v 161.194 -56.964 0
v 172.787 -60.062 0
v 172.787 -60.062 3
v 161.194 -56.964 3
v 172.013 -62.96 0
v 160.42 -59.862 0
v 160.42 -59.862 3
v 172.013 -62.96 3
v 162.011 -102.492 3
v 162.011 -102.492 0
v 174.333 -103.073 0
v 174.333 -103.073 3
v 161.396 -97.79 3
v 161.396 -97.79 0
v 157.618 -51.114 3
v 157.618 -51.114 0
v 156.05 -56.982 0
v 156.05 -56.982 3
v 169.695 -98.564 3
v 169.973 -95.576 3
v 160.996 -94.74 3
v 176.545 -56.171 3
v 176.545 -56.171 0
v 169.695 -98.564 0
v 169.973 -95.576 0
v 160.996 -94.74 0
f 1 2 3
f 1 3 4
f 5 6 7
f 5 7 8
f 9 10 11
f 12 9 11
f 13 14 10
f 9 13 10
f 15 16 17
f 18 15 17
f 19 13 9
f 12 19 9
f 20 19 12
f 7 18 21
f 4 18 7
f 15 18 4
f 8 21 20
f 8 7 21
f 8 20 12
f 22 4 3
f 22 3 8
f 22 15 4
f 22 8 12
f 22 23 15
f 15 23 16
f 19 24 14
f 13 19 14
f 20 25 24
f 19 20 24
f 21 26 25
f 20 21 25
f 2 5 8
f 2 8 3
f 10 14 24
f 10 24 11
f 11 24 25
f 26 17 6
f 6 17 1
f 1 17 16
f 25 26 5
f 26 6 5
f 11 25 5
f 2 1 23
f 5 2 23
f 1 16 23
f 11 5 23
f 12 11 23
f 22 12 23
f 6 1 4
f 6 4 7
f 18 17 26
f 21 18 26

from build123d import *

# Parameters (mm, degrees)
BASE_EXTRUDE_DEPTH = 3


with BuildPart() as part:
    # Sketch1 → Base-Extrude (new body)
    with BuildSketch(Plane.XY):
        Polygon((156.049697038, -56.981976311), (160.995963781, -94.739977013), (169.973055579, -95.576486697), (169.694713282, -98.563546383), (161.395541391, -97.790207109), (162.011434279, -102.491709341), (174.332527404, -103.072899505), (176.544882919, -56.17148924), (157.617642362, -51.114031919), align=None)
        Polygon((160.419784952, -59.862246689), (172.013048365, -62.960027094), (172.787493466, -60.061711241), (161.194230053, -56.963930836), align=None, mode=Mode.SUBTRACT)
    extrude(amount=BASE_EXTRUDE_DEPTH)


solid = part.part
